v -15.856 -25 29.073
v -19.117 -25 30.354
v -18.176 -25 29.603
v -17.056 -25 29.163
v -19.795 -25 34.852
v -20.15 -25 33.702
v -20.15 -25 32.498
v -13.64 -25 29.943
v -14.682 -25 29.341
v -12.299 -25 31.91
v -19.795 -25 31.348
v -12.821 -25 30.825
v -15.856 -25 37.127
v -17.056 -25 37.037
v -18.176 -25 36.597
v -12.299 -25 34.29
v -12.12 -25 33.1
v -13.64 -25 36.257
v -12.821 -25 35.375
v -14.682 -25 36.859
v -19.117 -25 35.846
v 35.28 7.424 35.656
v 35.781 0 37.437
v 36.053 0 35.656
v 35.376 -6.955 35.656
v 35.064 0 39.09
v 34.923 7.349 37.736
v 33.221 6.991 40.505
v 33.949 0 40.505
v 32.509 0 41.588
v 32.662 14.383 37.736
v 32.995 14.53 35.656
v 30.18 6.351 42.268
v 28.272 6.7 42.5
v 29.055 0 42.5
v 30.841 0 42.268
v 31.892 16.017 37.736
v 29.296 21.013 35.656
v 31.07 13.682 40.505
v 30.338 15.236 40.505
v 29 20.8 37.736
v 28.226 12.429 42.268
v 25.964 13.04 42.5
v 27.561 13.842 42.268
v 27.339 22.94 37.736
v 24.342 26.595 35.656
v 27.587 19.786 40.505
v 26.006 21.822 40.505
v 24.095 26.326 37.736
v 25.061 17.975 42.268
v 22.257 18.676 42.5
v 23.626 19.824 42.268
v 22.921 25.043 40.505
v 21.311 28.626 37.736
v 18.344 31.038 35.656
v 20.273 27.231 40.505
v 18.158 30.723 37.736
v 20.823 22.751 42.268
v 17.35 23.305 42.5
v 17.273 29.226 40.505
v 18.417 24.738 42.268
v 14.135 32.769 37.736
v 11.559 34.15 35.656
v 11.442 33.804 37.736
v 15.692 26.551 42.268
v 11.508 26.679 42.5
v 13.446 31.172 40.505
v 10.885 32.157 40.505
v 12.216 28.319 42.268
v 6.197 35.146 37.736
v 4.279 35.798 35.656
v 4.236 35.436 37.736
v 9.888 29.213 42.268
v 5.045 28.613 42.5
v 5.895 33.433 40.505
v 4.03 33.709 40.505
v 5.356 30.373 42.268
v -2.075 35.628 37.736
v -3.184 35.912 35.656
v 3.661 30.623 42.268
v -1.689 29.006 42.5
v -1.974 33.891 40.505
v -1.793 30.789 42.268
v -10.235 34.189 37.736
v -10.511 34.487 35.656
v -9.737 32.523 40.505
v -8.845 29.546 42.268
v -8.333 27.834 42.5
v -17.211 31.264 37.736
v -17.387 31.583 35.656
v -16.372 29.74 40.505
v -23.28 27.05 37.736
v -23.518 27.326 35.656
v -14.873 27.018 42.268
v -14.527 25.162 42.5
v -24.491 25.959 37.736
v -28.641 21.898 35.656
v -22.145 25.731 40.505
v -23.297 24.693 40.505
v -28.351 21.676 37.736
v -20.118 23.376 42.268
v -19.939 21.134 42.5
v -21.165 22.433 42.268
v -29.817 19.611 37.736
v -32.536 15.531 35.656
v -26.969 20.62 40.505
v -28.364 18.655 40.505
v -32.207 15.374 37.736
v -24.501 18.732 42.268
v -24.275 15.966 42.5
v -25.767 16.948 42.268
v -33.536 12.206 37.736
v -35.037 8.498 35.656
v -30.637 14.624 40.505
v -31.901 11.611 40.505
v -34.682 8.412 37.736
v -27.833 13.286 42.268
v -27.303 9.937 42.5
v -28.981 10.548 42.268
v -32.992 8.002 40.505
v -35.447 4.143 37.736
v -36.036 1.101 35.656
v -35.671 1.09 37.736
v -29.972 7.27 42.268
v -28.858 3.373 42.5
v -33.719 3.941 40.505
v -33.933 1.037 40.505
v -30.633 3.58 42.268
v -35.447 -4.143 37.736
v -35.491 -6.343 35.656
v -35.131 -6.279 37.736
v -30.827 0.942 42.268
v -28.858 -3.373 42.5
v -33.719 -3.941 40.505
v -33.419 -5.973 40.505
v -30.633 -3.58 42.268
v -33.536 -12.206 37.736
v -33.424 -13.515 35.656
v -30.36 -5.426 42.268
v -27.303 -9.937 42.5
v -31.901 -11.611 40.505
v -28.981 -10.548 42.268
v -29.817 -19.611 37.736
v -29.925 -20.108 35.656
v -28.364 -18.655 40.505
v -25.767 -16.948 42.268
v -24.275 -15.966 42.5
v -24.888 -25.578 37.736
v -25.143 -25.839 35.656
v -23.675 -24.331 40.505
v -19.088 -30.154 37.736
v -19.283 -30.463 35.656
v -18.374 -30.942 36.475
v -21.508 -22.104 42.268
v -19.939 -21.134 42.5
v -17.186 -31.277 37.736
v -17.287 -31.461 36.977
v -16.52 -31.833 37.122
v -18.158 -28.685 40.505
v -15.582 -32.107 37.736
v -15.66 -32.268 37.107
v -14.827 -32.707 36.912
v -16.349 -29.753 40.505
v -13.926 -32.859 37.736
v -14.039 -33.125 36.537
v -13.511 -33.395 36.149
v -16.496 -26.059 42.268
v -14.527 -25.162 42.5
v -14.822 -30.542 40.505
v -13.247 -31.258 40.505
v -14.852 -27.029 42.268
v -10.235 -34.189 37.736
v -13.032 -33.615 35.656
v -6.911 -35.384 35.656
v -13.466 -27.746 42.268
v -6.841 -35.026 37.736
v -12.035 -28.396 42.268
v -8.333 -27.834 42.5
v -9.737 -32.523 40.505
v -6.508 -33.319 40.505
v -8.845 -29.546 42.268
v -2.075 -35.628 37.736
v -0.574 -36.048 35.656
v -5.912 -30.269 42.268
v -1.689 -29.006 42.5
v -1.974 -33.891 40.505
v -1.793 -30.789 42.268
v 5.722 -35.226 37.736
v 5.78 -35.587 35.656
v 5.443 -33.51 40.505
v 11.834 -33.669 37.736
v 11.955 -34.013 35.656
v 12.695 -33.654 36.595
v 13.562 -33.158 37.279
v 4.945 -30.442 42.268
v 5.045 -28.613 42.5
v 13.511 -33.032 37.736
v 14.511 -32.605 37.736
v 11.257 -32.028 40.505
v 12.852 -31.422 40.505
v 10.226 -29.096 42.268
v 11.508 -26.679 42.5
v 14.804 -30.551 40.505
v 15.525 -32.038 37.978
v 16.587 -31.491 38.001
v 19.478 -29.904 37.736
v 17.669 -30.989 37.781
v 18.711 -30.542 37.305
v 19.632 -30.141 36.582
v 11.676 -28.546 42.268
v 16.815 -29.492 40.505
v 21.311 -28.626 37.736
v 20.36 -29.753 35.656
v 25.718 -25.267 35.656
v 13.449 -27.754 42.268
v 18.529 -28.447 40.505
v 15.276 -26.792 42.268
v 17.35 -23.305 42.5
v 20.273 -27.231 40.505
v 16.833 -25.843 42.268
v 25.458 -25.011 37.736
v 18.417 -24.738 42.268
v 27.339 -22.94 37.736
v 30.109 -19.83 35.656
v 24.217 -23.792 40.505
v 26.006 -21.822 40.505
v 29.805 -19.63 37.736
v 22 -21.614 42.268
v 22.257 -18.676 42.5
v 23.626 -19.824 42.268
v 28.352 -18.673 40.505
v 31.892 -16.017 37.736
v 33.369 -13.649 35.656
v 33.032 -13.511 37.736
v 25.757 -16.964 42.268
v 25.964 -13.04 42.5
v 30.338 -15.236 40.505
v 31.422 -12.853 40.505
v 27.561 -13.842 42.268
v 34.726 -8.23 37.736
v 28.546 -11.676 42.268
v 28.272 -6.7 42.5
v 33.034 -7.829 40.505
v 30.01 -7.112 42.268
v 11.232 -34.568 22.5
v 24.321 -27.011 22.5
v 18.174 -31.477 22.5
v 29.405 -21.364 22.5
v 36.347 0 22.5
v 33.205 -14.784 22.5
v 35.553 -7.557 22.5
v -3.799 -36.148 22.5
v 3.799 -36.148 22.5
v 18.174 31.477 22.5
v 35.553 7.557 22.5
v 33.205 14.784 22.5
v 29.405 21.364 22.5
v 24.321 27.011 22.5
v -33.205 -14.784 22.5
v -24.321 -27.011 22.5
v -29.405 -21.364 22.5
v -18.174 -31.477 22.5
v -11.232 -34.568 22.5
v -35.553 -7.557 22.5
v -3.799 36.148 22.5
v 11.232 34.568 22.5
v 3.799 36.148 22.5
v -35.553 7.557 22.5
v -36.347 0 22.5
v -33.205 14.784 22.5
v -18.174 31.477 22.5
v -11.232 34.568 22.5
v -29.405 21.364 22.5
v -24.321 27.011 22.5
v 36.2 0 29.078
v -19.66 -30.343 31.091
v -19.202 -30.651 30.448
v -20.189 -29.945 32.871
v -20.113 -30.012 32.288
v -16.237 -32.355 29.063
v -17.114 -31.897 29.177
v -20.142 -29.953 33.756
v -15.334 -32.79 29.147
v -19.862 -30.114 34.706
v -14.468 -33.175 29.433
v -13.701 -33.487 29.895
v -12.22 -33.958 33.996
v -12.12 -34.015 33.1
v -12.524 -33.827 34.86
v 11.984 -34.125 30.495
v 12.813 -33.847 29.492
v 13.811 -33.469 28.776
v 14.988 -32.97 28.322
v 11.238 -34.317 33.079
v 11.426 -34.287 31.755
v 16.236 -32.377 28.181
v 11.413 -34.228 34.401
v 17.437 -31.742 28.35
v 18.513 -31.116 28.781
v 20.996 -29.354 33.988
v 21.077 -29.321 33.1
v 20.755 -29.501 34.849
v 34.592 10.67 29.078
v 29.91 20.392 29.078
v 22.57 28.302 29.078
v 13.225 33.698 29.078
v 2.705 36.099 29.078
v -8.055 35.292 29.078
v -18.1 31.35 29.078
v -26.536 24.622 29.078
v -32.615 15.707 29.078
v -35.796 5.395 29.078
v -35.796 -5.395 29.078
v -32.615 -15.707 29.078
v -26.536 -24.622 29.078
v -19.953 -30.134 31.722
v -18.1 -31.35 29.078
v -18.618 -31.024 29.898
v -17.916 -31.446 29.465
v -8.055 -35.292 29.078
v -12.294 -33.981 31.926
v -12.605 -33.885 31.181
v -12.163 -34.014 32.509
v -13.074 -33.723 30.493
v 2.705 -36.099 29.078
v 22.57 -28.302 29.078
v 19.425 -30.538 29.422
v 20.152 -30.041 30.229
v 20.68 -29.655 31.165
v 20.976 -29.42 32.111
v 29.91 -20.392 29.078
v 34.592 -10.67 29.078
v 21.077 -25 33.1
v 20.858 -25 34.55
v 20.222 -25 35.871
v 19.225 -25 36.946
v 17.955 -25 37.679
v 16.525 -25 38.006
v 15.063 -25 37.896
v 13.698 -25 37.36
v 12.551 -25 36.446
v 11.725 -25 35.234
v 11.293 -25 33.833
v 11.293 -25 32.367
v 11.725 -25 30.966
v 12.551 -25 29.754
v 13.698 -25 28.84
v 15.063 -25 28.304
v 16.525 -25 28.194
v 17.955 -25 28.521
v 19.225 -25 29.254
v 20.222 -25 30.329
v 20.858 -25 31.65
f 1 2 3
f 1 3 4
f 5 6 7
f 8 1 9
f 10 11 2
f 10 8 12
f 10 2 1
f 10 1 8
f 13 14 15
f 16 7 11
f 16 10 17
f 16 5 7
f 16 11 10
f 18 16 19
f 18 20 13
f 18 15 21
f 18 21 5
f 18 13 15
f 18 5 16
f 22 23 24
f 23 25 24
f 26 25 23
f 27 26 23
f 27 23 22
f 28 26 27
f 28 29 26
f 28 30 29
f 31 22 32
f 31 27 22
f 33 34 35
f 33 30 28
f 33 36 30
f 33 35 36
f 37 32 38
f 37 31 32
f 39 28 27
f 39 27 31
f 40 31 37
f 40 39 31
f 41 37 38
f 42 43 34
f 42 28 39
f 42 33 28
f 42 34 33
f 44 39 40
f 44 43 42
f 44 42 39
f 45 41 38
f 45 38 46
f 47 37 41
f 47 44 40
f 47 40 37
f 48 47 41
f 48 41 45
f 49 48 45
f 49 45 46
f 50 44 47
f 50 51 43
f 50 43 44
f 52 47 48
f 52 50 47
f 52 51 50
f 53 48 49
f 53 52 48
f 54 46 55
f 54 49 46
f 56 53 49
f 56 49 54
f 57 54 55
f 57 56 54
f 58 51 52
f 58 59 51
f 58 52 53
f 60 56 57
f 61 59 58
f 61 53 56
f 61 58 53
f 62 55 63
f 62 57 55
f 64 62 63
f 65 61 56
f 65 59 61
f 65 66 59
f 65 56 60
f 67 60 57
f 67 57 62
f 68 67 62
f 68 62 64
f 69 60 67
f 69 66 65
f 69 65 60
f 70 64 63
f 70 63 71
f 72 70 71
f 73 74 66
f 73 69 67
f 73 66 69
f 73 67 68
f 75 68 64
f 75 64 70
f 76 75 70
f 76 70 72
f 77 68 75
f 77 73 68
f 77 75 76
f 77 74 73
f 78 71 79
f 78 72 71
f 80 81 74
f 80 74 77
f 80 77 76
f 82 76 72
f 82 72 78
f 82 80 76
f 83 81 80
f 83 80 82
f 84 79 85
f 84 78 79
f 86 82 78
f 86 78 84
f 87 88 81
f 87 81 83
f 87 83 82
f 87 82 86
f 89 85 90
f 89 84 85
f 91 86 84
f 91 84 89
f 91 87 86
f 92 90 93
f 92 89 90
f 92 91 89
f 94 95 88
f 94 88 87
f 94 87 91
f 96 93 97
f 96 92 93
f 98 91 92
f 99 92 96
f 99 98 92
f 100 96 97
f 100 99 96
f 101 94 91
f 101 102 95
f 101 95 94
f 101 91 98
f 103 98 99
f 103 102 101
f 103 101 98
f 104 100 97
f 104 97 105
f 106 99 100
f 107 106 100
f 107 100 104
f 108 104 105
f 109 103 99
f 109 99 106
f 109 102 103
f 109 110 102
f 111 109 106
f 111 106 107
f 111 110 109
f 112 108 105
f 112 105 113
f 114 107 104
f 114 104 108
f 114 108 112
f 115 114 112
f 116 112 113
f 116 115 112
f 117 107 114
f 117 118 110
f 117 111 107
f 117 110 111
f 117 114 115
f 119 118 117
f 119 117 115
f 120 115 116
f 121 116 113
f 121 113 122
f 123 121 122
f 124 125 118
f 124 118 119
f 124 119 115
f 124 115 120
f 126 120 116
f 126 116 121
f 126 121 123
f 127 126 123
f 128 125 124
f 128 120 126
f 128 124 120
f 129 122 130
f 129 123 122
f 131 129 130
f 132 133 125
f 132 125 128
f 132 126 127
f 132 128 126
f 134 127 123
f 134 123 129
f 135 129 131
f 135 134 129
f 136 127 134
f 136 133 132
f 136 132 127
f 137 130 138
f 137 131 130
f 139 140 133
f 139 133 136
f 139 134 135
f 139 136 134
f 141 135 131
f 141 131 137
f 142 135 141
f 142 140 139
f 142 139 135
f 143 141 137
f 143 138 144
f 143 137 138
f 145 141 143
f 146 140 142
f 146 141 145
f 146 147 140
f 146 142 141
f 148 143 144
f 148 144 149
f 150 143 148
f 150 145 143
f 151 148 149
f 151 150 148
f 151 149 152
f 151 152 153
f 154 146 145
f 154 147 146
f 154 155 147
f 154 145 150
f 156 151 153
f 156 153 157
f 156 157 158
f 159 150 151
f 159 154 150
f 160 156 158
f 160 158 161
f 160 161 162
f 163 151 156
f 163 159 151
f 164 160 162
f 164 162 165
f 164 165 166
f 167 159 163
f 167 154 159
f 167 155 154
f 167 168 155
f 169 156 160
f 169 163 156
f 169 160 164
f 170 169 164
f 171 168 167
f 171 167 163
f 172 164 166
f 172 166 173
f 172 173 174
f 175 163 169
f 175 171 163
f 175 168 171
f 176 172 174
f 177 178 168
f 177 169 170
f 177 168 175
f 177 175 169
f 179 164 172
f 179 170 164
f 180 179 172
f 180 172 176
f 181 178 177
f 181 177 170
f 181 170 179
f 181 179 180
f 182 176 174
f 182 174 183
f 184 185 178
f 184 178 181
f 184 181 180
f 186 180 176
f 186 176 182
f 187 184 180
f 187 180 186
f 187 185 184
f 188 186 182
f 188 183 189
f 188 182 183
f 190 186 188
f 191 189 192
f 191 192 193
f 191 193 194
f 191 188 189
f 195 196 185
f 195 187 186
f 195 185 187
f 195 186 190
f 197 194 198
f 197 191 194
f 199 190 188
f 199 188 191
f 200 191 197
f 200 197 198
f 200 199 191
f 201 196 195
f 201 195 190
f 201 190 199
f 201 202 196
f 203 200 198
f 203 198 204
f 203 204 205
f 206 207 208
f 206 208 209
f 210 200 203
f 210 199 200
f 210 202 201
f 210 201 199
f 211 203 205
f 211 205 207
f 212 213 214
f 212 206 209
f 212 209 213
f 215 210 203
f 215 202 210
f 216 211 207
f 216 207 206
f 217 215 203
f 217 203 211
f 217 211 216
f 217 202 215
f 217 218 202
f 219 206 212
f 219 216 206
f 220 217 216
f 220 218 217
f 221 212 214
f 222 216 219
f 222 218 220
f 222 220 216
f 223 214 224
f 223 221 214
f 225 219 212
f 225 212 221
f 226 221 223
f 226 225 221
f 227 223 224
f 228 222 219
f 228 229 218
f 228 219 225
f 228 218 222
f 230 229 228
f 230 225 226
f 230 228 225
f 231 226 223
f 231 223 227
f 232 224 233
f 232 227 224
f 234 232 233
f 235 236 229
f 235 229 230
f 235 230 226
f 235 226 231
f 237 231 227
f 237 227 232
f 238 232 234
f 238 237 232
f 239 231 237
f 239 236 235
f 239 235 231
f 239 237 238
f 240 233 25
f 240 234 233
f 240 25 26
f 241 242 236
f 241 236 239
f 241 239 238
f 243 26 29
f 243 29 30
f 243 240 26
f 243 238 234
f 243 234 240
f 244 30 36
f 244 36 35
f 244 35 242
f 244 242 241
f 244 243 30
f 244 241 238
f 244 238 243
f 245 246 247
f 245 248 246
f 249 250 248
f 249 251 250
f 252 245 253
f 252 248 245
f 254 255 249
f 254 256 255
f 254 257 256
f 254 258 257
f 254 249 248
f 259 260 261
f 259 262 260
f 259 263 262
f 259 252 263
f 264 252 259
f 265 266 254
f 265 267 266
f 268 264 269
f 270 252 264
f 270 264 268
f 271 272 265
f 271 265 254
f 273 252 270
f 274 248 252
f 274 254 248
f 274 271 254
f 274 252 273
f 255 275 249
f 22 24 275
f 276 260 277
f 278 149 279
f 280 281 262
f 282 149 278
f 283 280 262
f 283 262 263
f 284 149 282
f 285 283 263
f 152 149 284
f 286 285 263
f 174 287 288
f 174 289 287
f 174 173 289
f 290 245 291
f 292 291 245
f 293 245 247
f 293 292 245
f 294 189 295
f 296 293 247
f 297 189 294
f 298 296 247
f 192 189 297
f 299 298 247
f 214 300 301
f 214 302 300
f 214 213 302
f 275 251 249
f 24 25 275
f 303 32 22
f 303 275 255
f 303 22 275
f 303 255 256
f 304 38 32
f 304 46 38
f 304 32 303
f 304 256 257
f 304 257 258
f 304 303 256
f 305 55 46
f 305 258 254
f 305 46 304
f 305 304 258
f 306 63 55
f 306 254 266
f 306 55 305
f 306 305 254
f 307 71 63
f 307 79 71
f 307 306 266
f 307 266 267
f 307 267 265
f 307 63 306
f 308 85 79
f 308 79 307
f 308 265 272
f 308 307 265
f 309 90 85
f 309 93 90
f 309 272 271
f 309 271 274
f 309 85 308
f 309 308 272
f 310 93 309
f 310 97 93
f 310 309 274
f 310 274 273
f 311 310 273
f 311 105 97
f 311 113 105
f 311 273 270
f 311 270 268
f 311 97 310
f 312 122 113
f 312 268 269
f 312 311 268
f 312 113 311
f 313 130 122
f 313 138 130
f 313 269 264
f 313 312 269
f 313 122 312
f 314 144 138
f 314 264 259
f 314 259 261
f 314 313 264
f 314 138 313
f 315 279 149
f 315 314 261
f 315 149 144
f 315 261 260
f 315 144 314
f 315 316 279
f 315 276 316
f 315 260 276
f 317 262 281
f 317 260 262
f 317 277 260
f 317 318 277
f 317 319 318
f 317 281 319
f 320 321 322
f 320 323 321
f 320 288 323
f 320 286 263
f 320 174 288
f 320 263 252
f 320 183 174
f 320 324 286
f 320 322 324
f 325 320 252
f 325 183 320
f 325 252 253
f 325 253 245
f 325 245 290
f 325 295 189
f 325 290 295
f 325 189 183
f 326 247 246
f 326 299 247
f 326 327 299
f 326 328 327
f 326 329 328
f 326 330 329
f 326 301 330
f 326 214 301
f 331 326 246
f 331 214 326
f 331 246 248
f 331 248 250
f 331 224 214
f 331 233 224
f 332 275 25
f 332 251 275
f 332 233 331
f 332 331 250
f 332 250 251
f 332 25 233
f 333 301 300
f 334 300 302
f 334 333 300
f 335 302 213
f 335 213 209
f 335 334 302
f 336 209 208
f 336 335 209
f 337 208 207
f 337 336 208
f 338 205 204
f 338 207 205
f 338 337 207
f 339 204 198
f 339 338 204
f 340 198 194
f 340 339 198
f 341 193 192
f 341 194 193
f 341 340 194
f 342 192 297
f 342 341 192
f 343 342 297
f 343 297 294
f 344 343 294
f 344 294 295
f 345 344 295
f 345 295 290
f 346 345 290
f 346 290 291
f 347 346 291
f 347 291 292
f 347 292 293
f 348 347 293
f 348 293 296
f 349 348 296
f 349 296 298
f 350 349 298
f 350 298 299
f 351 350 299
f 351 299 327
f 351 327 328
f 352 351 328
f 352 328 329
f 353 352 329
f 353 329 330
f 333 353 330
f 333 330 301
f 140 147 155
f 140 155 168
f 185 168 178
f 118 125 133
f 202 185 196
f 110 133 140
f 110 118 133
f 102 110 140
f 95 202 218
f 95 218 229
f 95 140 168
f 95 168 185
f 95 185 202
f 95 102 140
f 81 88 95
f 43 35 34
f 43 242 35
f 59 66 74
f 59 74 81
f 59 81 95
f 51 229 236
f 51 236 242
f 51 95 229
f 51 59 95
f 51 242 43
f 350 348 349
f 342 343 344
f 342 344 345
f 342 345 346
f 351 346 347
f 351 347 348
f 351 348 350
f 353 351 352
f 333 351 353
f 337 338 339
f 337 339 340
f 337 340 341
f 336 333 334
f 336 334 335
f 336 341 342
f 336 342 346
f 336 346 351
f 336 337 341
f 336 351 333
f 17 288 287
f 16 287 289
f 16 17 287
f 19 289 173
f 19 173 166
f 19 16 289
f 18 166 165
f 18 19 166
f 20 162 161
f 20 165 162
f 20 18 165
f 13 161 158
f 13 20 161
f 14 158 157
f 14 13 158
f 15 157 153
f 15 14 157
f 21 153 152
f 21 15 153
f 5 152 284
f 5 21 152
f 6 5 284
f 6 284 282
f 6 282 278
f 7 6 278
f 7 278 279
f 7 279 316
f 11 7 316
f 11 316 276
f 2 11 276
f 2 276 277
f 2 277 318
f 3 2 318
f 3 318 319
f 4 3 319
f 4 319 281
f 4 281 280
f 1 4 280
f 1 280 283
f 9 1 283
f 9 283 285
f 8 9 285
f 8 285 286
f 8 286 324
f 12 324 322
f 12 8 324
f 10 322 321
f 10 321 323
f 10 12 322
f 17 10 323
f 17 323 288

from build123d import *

# Parameters (mm, degrees)
FILLET047_R     = 7
SKETCH198_R     = 4.037815
SKETCH198_R_2   = 4.91935
POCKET063_DEPTH = 11.348059


with BuildPart() as part:
    # Sketch197 → Revolution001 (revolve)
    with BuildSketch(Plane.XZ):
        Polygon((0, 22.5), (36.347059, 22.5), (35.9, 42.5), (0, 42.5), align=None)
    revolve(axis=Axis((0, 0, 0), (0, 0, 1)))

    # Fillet047
    fillet047_edges = [part.edges().sort_by_distance(p)[0] for p in [
        (-35.9, 0, 42.5),
    ]]
    fillet(fillet047_edges, radius=FILLET047_R)

    # Sketch198 → Pocket063 (cut, through all)
    with BuildSketch(Plane.XZ.offset(25)):
        with Locations((-16.157519, 33.1)):
            Circle(SKETCH198_R)
        with Locations((16.157519, 33.1)):
            Circle(SKETCH198_R_2)
    extrude(amount=POCKET063_DEPTH, mode=Mode.SUBTRACT)


solid = part.part
